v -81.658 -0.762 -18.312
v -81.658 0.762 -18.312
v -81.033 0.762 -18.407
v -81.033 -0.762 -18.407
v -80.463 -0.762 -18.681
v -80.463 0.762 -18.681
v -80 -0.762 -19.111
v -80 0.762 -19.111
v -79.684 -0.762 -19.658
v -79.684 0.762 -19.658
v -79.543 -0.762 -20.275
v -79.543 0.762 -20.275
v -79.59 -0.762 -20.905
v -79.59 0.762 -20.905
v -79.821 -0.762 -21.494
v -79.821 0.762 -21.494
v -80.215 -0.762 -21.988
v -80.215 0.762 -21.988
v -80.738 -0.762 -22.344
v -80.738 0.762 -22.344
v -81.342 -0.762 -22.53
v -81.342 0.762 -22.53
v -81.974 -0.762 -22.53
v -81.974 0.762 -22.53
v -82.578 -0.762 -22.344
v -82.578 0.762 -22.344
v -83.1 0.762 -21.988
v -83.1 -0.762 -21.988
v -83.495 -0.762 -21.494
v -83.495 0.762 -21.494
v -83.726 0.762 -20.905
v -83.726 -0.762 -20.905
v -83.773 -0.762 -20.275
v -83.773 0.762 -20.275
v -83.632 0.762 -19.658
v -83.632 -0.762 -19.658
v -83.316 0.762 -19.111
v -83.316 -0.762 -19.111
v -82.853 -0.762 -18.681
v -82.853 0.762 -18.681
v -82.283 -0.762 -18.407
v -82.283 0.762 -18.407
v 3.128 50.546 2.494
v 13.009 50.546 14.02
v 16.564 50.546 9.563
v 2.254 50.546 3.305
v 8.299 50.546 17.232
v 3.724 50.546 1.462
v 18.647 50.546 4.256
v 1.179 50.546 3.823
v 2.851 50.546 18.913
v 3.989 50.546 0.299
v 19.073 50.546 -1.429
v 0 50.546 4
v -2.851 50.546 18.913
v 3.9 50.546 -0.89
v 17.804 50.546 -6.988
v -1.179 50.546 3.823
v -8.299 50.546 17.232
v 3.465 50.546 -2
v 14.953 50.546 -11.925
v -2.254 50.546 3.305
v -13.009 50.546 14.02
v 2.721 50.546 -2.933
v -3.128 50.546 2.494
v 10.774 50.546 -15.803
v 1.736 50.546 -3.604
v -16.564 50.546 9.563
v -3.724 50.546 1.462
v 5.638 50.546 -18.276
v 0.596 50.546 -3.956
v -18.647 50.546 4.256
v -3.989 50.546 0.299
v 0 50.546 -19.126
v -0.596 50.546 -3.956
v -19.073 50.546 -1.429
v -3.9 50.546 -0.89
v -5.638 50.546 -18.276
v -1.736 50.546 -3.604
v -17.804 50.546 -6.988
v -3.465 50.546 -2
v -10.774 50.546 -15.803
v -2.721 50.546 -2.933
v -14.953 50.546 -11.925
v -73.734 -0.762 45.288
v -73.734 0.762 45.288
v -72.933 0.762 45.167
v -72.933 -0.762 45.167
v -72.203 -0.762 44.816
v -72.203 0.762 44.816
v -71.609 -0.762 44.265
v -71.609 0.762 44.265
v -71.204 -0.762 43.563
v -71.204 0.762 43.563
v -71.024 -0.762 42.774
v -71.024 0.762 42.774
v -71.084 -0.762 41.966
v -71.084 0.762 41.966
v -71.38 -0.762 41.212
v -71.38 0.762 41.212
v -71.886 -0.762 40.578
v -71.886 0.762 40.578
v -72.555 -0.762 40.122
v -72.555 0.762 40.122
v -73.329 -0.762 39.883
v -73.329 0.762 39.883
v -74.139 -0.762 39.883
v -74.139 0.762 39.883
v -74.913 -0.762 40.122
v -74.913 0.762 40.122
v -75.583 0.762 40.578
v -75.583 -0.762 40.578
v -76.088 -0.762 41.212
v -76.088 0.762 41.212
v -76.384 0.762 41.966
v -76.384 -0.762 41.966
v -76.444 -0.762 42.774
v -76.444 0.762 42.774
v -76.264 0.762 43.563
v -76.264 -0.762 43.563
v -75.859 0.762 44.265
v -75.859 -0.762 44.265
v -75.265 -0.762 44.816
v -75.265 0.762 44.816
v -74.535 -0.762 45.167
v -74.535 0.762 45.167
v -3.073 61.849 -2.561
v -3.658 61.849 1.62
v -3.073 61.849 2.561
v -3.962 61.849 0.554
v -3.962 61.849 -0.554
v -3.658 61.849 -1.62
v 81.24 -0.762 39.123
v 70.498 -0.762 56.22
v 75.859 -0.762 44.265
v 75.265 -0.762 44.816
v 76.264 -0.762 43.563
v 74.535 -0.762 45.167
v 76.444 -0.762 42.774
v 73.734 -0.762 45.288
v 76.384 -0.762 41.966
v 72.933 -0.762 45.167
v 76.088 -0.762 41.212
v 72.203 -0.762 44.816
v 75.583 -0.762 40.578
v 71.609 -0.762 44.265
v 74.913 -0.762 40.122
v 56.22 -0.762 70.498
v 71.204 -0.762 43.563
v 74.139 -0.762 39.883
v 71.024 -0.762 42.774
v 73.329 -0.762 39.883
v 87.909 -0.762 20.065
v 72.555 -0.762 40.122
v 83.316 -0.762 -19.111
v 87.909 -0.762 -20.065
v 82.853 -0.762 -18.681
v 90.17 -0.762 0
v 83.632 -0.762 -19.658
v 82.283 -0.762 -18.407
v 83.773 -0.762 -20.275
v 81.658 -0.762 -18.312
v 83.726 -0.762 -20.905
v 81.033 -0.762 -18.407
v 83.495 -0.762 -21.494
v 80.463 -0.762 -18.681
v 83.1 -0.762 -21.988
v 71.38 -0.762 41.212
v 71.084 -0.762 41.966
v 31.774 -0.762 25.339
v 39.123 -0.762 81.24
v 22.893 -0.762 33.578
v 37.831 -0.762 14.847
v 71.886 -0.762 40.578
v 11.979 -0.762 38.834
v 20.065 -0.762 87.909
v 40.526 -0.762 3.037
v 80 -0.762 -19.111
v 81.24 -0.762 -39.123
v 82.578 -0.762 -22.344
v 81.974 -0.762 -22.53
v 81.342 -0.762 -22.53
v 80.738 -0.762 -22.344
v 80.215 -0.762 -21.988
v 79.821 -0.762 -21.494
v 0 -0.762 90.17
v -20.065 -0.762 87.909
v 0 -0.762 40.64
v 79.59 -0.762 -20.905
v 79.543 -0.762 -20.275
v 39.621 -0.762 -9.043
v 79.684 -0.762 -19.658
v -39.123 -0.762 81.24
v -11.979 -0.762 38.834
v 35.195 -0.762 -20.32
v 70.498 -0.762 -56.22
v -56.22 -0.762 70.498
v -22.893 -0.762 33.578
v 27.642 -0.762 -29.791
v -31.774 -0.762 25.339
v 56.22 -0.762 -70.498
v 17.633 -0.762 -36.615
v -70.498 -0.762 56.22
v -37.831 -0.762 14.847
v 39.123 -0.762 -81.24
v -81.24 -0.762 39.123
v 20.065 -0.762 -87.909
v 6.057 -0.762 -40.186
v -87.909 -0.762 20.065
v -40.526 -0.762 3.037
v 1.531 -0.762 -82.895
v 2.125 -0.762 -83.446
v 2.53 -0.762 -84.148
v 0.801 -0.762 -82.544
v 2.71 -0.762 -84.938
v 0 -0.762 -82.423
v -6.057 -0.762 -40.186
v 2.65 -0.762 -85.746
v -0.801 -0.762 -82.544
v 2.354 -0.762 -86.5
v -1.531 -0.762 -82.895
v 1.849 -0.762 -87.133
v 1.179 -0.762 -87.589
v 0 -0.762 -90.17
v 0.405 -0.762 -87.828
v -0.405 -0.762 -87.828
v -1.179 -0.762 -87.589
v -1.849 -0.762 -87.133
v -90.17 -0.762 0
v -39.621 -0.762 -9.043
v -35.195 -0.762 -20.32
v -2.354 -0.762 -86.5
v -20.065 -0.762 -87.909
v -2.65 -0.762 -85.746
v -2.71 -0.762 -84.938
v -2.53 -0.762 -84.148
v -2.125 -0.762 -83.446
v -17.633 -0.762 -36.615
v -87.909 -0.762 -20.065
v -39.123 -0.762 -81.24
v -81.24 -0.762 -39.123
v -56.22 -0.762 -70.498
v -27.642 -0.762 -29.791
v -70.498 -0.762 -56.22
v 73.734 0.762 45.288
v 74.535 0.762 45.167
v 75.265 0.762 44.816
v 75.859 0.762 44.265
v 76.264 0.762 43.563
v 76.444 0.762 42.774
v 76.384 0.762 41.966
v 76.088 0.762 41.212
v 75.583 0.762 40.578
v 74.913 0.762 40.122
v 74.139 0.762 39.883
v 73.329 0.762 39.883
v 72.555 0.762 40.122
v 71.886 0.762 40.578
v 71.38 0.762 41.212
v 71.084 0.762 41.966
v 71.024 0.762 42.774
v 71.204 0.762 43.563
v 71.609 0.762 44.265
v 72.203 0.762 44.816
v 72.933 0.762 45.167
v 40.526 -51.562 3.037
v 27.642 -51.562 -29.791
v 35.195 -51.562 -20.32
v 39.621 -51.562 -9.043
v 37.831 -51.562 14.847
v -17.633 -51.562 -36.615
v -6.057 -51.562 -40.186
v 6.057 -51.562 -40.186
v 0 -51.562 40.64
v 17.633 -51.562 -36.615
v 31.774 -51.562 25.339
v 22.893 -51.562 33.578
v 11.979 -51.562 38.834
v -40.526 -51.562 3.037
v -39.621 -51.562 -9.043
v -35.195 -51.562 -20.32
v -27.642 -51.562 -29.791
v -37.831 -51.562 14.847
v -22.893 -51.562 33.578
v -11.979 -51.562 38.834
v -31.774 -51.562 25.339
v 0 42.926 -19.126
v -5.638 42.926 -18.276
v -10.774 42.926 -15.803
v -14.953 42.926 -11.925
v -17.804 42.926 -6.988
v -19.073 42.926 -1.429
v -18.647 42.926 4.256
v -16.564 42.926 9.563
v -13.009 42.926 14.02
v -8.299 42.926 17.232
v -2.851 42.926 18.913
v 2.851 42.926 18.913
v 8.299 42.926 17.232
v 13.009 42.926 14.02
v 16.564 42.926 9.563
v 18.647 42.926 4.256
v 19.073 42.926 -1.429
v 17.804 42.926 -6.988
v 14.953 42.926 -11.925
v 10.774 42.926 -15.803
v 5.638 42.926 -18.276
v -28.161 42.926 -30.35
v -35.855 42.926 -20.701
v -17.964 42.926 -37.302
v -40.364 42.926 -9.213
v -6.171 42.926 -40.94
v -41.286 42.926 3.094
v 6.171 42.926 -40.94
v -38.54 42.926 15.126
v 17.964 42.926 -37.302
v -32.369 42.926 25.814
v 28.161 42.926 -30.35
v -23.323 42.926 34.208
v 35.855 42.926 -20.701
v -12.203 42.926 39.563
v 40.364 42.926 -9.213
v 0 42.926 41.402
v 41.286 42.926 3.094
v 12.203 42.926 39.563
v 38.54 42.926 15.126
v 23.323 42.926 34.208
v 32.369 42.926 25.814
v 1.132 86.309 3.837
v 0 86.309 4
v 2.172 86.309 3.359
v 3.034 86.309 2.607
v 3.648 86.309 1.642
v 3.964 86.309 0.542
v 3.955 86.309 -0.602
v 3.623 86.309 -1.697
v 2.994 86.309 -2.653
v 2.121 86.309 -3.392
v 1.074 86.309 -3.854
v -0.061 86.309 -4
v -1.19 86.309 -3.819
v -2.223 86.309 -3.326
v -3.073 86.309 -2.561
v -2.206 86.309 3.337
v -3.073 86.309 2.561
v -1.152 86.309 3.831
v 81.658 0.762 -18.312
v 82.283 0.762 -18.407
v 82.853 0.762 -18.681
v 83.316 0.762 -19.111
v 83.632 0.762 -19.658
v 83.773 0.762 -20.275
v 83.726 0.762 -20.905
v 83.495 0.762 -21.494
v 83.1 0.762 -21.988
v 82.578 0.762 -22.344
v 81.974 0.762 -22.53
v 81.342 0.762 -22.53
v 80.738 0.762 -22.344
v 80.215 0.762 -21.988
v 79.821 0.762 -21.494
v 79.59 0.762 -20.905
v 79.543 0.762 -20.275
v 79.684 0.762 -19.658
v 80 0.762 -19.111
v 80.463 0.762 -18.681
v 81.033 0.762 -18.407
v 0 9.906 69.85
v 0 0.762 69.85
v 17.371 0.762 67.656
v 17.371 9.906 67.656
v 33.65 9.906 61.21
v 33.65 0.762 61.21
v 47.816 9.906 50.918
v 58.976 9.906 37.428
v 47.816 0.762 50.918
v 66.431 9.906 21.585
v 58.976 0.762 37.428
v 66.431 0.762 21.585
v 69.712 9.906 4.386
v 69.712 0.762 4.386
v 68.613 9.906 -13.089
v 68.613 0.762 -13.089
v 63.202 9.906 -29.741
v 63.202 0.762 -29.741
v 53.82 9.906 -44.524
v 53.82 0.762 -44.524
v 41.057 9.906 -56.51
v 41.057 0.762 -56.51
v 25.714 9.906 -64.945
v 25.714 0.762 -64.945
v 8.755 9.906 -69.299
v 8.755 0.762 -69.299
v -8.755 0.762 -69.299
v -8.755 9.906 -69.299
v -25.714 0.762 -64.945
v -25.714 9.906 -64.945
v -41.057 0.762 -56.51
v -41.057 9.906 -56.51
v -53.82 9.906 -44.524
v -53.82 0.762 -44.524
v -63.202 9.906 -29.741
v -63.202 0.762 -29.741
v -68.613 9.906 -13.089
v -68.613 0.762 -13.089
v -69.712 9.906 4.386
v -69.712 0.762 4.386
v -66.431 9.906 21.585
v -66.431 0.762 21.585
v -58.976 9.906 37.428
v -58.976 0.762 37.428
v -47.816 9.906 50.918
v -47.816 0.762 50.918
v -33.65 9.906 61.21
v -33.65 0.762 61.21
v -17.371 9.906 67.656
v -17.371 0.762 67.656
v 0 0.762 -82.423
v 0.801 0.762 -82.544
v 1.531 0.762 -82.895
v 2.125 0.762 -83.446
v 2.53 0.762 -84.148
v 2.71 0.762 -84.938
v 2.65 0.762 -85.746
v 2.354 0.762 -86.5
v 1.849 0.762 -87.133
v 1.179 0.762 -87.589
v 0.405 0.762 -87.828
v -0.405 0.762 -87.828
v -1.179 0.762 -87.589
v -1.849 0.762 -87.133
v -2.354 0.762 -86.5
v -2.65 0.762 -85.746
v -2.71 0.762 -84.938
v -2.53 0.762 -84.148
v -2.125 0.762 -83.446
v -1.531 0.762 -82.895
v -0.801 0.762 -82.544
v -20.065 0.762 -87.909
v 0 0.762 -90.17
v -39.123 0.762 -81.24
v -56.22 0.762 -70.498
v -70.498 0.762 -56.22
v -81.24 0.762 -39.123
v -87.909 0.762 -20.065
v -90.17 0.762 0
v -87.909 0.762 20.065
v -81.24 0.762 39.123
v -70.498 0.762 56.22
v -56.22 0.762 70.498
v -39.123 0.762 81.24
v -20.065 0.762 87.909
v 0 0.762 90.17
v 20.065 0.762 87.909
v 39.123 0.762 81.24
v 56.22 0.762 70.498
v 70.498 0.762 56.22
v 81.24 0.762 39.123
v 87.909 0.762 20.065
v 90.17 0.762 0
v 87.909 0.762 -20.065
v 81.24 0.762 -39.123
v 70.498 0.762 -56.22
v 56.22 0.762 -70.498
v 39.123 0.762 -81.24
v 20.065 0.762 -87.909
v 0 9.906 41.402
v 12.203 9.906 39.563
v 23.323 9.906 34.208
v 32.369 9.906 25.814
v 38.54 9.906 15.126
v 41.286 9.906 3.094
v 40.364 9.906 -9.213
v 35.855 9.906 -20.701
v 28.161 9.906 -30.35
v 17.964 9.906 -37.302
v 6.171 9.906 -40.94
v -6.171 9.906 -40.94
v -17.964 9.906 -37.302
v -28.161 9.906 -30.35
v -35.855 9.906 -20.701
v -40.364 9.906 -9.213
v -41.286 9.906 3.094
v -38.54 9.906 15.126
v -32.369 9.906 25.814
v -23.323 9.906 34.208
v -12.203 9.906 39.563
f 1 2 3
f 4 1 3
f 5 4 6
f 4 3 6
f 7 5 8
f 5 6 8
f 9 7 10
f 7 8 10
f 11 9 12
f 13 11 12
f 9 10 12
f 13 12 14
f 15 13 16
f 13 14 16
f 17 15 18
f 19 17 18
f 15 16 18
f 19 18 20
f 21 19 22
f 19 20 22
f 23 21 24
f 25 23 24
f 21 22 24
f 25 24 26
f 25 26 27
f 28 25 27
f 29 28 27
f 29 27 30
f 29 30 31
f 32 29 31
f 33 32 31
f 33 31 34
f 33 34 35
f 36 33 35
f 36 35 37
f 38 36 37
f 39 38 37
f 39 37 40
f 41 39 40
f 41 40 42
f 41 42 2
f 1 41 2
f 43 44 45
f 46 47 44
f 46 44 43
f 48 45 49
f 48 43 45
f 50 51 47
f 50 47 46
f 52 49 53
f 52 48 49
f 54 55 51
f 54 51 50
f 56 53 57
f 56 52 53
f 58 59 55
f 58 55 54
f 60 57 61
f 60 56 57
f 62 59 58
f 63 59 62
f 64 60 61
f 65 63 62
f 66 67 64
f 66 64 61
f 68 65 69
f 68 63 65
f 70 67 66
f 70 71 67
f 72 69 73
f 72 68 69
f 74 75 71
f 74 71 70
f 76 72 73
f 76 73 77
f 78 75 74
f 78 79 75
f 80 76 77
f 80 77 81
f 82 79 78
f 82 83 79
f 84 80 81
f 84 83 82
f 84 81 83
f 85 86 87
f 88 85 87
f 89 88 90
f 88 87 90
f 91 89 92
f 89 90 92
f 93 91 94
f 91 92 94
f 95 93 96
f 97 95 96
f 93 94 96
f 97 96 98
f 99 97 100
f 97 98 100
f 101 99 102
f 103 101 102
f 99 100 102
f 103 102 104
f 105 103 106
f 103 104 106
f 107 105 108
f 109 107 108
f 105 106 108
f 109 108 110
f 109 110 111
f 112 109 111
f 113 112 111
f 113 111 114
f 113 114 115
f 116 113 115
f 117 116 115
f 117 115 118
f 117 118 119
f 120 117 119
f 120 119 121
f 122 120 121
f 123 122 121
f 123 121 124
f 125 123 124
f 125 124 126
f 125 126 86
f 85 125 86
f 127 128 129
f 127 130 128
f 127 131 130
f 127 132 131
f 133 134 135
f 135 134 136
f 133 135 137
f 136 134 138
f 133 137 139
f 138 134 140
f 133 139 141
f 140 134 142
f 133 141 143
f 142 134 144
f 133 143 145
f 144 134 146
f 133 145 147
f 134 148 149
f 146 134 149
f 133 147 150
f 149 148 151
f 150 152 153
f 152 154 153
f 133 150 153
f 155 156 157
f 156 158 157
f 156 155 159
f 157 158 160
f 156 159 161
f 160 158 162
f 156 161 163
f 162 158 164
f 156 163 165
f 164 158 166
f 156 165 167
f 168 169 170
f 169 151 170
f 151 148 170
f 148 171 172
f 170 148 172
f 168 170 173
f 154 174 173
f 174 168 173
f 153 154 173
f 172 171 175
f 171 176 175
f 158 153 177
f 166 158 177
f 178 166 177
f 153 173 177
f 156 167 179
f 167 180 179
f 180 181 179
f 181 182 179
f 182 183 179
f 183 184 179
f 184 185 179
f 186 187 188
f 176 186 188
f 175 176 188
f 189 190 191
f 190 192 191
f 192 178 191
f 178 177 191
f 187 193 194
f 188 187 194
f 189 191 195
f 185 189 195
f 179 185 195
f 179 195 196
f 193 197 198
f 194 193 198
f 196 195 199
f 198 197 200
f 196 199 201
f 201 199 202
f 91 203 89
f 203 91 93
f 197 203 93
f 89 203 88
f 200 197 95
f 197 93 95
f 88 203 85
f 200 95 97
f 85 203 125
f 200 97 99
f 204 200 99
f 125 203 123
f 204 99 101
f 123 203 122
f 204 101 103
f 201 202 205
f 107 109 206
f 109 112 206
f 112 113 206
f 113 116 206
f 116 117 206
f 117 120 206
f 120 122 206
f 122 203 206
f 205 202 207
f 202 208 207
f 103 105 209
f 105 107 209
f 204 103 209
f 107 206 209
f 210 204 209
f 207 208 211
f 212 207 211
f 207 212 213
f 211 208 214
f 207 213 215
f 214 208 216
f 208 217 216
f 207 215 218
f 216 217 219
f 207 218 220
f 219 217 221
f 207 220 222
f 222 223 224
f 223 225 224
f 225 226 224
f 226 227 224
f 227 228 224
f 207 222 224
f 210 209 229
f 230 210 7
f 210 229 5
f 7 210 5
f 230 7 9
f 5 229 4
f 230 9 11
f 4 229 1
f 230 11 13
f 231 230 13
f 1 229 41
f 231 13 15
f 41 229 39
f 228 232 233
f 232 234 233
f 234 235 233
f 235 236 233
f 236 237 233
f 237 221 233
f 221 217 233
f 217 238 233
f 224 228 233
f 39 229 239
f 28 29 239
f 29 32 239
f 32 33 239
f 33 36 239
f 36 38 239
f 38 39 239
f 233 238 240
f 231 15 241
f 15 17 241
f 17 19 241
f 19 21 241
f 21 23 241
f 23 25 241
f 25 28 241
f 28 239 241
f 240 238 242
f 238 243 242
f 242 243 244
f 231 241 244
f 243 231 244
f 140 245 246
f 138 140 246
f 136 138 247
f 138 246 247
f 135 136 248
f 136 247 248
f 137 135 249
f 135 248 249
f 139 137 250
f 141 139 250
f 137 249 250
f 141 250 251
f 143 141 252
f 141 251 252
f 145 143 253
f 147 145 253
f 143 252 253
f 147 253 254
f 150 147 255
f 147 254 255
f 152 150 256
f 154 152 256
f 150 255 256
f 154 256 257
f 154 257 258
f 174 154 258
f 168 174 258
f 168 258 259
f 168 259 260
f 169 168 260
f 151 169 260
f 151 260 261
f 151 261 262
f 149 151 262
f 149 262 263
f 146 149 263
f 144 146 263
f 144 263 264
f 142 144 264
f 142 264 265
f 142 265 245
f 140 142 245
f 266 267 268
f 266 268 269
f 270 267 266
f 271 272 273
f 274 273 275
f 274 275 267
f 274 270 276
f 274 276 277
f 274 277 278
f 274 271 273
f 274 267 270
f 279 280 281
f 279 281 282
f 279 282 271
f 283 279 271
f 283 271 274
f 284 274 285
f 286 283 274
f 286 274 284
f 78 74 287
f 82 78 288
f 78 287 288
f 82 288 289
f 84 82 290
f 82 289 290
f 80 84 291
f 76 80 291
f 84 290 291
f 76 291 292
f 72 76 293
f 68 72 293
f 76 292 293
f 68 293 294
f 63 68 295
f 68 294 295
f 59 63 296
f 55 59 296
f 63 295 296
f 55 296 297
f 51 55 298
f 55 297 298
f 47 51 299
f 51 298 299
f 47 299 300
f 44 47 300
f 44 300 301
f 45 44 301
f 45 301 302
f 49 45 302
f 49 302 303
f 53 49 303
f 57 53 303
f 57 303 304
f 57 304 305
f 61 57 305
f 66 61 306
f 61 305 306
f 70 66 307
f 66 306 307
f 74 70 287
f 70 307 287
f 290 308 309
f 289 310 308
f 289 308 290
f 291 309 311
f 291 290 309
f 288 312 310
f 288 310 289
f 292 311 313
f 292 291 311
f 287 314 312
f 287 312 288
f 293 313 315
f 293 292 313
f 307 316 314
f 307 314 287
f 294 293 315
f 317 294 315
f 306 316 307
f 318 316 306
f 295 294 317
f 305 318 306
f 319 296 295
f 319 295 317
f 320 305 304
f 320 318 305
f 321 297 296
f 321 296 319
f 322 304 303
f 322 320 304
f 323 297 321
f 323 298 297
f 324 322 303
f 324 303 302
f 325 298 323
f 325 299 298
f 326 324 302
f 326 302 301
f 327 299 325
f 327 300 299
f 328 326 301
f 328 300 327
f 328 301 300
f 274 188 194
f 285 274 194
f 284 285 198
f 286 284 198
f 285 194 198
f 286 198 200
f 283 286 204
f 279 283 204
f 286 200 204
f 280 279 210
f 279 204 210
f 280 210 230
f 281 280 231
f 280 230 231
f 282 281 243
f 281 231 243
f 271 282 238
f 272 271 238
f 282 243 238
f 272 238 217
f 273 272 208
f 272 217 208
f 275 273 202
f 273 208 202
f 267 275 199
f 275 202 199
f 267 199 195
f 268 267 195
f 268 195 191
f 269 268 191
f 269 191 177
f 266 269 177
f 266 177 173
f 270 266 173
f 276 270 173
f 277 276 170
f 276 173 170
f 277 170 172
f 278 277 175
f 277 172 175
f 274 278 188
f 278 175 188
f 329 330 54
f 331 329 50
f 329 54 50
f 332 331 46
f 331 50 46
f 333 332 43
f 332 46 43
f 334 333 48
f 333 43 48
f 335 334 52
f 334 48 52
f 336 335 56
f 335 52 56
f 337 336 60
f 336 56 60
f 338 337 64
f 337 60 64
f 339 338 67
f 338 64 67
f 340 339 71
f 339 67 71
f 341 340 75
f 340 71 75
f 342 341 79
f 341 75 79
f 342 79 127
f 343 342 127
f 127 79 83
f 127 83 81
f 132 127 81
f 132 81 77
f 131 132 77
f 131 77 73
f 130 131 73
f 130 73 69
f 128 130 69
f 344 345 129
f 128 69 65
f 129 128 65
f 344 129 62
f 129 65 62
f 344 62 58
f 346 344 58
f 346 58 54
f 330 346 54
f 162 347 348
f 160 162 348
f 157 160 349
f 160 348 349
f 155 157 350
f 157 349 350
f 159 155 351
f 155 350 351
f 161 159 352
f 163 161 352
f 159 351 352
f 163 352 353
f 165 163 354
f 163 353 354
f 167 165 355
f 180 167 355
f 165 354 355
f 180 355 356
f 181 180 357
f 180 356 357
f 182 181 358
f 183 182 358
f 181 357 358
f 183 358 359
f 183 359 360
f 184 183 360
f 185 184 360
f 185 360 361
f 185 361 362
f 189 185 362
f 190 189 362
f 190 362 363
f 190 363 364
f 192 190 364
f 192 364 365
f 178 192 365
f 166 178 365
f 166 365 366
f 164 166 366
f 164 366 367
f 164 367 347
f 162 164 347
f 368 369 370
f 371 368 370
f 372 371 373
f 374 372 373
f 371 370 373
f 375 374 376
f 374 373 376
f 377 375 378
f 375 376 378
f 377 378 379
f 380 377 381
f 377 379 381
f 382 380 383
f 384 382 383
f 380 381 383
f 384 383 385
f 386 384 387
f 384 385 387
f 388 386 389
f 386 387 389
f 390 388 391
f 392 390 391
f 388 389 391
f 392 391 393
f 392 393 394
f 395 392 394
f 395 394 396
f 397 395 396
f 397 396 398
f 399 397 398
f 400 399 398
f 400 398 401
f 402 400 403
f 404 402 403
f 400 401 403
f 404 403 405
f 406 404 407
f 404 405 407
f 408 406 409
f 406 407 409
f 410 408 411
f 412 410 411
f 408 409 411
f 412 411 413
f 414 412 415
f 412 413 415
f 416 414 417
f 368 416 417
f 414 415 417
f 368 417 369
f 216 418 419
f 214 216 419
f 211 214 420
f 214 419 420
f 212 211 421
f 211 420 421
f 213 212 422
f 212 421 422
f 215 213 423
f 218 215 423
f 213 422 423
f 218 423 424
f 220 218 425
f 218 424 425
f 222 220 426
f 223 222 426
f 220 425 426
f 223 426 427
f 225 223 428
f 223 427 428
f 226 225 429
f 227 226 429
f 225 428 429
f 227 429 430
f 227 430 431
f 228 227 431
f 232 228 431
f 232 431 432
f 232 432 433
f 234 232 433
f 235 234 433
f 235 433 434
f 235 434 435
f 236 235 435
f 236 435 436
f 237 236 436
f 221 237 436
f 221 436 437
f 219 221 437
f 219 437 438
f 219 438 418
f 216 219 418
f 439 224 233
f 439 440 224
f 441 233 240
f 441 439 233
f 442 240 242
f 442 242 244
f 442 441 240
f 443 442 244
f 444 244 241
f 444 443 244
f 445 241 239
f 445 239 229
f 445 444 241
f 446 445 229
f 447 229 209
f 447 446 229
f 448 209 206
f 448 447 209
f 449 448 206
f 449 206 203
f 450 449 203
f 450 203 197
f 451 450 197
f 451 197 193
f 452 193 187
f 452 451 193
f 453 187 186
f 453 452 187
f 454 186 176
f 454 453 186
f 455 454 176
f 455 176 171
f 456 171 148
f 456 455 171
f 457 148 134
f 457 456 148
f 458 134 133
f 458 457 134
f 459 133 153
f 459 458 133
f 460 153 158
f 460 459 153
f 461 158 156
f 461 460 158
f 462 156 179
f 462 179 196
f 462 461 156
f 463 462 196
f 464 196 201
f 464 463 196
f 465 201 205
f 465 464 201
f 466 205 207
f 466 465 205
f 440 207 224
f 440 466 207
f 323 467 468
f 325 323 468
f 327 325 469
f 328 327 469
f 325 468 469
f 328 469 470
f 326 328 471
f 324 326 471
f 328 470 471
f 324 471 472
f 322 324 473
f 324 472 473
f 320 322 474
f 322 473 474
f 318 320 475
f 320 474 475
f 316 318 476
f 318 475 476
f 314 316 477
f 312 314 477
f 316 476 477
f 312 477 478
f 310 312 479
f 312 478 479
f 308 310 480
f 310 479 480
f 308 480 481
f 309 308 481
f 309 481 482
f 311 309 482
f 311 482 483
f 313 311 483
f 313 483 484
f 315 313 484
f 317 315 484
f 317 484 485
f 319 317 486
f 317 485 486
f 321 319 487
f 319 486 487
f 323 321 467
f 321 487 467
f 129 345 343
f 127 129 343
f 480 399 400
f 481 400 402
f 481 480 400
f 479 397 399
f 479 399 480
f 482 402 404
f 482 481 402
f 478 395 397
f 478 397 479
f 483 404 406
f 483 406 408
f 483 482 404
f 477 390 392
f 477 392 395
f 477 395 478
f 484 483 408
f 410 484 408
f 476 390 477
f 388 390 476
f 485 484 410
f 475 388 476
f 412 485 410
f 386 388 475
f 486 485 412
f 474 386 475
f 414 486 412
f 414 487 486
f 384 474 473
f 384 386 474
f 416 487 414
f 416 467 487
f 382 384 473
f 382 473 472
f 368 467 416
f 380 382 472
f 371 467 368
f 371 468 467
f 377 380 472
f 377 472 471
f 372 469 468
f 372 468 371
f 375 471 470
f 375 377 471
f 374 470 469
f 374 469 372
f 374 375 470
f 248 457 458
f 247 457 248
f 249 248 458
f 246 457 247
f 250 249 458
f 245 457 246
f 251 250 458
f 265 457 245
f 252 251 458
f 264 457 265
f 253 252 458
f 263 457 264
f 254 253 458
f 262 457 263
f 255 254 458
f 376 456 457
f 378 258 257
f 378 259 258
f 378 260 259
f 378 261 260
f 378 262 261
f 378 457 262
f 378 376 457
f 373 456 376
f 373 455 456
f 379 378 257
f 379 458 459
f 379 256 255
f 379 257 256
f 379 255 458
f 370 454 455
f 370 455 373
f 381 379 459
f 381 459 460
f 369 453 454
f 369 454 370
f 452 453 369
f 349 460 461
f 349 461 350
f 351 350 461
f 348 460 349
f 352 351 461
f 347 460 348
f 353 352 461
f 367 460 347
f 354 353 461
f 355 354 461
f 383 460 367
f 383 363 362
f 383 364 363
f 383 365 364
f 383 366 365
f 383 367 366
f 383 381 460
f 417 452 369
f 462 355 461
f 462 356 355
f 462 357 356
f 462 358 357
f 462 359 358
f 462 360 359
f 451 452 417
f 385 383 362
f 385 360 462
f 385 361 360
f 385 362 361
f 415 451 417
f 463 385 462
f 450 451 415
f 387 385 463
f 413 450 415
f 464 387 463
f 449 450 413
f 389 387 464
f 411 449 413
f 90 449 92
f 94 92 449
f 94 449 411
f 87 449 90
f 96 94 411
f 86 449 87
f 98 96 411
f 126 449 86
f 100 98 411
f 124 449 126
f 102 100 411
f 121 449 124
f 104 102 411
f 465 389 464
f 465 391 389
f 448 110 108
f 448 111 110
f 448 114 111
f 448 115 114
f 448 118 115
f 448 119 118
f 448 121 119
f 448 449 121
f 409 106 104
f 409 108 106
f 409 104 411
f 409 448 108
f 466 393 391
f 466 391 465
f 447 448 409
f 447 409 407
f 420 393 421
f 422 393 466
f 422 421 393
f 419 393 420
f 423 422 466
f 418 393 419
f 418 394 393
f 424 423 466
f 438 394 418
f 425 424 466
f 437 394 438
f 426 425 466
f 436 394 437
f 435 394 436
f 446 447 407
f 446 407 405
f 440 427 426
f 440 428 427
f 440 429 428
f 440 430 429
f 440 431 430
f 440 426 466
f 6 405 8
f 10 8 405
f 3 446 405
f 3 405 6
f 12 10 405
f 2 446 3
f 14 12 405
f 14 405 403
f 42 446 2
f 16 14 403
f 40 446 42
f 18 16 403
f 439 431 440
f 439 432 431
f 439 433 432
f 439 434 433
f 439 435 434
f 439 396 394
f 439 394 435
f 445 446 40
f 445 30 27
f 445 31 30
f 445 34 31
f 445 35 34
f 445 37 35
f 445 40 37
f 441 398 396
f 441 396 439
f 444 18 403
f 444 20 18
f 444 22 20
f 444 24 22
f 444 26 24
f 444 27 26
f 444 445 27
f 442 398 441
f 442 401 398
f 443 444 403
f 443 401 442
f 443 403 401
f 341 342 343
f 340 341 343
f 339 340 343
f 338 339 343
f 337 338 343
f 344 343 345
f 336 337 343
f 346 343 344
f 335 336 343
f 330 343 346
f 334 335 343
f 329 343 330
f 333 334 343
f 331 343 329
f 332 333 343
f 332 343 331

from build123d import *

# Parameters (mm, degrees)
SKETCH1_R           = 90.17
BOSS_EXTRUDE1_DEPTH = 0.762
SKETCH2_R           = 69.85
BOSS_EXTRUDE2_DEPTH = 9.144
SKETCH3_R           = 41.402
BOSS_EXTRUDE3_DEPTH = 33.02
SKETCH4_R           = 19.1262
BOSS_EXTRUDE4_DEPTH = 7.62
SKETCH5_R           = 4.0005
BOSS_EXTRUDE5_DEPTH = 35.7632
CUT_EXTRUDE1_DEPTH  = 24.4602
SKETCH7_R           = 2.7178
CUT_EXTRUDE2_DEPTH  = 6.35
SKETCH8_R           = 2.1209
CUT_EXTRUDE3_DEPTH  = 6.35
SKETCH9_R           = 40.64
BOSS_EXTRUDE6_DEPTH = 50.8


with BuildPart() as part:
    # Sketch1 → Boss-Extrude1 (new, symmetric)
    with BuildSketch(Plane(origin=(0, 0, 0), x_dir=(1, 0, 0), z_dir=(0, 1, 0))):
        with Locations(Location((0, 0, 0), (0, 0, 90))):
            Circle(SKETCH1_R)
    extrude(amount=BOSS_EXTRUDE1_DEPTH, both=True)

    # Sketch2 → Boss-Extrude2 (add)
    with BuildSketch(Plane(origin=(0, 0.762, 0), x_dir=(1, 0, 0), z_dir=(0, 1, 0))):
        with Locations(Location((0, 0, 0), (0, 0, 270))):
            Circle(SKETCH2_R)
    extrude(amount=BOSS_EXTRUDE2_DEPTH)

    # Sketch3 → Boss-Extrude3 (add)
    with BuildSketch(Plane(origin=(0, 9.906, 0), x_dir=(1, 0, 0), z_dir=(0, 1, 0))):
        with Locations(Location((0, 0, 0), (0, 0, 270))):
            Circle(SKETCH3_R)
    extrude(amount=BOSS_EXTRUDE3_DEPTH)

    # Sketch4 → Boss-Extrude4 (add)
    with BuildSketch(Plane(origin=(0, 42.926, 0), x_dir=(1, 0, 0), z_dir=(0, 1, 0))):
        with Locations(Location((0, 0, 0), (0, 0, 90))):
            Circle(SKETCH4_R)
    extrude(amount=BOSS_EXTRUDE4_DEPTH)

    # Sketch5 → Boss-Extrude5 (add)
    with BuildSketch(Plane(origin=(0, 50.546, 0), x_dir=(1, 0, 0), z_dir=(0, 1, 0))):
        with Locations(Location((0, 0, 0), (0, 0, 270))):
            Circle(SKETCH5_R)
    extrude(amount=BOSS_EXTRUDE5_DEPTH)

    # Sketch6 → Cut-Extrude1 (cut)
    with BuildSketch(Plane(origin=(0, 86.3092, 0), x_dir=(1, 0, 0), z_dir=(0, 1, 0))):
        with BuildLine():
            Line((-3.0734, -2.6797), (-3.0734, 2.6797))
            ThreePointArc((-3.0734, 2.6797), (-4.077570312, 0), (-3.0734, -2.6797))
        make_face()
    extrude(amount=-CUT_EXTRUDE1_DEPTH, mode=Mode.SUBTRACT)

    # Sketch7 → Cut-Extrude2 (cut)
    with BuildSketch(Plane(origin=(0, 0.762, 0), x_dir=(1, 0, 0), z_dir=(0, 1, 0))):
        with Locations(Location((0, 85.1408, 0), (0, 0, 270))):
            Circle(SKETCH7_R)
        with Locations(Location((73.734095699, -42.5704, 0), (0, 0, 270))):
            Circle(SKETCH7_R)
        with Locations(Location((-73.734095699, -42.5704, 0), (0, 0, 270))):
            Circle(SKETCH7_R)
    extrude(amount=-CUT_EXTRUDE2_DEPTH, mode=Mode.SUBTRACT)

    # Sketch8 → Cut-Extrude3 (cut)
    with BuildSketch(Plane(origin=(0, 0.762, 0), x_dir=(1, 0, 0), z_dir=(0, 1, 0))):
        with Locations(Location((-81.657901206, 20.433276927, 0), (0, 0, 270))):
            Circle(SKETCH8_R)
        with Locations(Location((81.657901206, 20.433276927, 0), (0, 0, 270))):
            Circle(SKETCH8_R)
    extrude(amount=-CUT_EXTRUDE3_DEPTH, mode=Mode.SUBTRACT)

    # Sketch9 → Boss-Extrude6 (add)
    with BuildSketch(Plane.XZ.offset(0.762)):
        with Locations(Location((0, 0, 0), (0, 0, 90))):
            Circle(SKETCH9_R)
    extrude(amount=BOSS_EXTRUDE6_DEPTH)


solid = part.part
